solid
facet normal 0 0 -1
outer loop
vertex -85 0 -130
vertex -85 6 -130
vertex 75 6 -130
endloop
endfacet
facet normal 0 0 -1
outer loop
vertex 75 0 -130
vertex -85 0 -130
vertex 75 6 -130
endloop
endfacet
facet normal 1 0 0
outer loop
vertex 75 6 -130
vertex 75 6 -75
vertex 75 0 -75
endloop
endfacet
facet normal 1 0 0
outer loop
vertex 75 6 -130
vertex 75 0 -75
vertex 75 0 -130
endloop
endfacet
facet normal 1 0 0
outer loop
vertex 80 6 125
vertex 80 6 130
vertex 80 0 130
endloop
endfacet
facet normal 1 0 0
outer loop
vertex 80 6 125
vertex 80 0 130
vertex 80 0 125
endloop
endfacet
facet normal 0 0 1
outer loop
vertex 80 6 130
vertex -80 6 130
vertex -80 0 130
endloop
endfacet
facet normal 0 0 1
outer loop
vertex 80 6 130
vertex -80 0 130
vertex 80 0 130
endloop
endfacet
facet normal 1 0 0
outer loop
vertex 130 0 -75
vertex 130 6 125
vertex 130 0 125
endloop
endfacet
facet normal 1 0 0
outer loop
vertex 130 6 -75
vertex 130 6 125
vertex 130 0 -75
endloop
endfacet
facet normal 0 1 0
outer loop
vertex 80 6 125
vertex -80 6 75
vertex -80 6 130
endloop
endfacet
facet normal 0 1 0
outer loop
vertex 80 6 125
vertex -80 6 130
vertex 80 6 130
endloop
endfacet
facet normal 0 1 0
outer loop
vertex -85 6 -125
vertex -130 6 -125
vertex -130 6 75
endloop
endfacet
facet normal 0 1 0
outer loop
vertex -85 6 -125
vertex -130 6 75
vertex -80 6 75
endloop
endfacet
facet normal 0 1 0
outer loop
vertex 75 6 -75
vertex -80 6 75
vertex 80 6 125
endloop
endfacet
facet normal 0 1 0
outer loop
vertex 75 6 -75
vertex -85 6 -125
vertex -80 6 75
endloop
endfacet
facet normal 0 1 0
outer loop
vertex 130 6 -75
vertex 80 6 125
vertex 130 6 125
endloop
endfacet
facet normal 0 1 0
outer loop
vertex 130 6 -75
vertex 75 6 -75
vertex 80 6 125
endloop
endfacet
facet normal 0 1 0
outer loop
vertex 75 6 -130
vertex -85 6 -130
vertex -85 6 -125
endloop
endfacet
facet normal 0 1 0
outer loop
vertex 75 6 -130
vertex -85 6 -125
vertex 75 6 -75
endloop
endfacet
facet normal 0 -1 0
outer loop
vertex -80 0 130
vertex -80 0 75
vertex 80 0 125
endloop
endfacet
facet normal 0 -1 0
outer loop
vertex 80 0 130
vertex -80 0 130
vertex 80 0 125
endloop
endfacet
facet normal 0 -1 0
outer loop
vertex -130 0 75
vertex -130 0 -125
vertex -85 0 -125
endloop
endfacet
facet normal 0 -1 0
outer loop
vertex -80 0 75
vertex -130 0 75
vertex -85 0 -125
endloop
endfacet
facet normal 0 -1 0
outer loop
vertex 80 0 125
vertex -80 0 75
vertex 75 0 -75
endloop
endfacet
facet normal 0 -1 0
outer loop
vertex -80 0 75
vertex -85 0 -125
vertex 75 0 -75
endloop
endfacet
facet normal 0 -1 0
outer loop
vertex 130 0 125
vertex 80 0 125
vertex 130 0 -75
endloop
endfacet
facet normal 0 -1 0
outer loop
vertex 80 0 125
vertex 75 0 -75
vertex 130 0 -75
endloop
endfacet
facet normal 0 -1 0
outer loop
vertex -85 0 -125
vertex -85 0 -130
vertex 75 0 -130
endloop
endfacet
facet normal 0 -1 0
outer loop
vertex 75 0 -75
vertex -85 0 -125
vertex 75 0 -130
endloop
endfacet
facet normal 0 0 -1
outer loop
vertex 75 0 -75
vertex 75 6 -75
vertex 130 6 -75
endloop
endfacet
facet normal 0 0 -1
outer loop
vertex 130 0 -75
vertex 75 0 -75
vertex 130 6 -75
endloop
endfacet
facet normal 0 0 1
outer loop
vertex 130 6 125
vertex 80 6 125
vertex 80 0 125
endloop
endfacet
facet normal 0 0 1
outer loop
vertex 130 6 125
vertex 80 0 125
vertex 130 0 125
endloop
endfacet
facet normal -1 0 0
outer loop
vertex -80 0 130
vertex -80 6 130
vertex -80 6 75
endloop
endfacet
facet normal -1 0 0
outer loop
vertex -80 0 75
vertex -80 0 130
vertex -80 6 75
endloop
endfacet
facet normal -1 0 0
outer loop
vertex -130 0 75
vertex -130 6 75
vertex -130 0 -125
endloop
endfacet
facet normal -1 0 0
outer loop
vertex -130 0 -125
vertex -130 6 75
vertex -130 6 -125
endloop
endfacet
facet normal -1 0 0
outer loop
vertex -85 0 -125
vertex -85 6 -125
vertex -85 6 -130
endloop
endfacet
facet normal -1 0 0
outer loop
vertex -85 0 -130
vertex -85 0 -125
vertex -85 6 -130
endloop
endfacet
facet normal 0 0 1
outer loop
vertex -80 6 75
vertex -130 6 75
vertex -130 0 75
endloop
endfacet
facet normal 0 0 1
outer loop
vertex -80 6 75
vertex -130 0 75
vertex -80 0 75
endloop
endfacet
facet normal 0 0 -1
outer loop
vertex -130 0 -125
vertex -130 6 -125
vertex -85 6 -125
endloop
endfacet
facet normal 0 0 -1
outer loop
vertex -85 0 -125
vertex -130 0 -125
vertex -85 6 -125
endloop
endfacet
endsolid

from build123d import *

# Parameters (mm, degrees)
SKETCH1_W           = 150
SKETCH1_H           = 150
BOSS_EXTRUDE1_DEPTH = 6
CUT_EXTRUDE2_DEPTH  = 6
SKETCH3_W           = 55
SKETCH3_H           = 200
BOSS_EXTRUDE3_DEPTH = 6
SKETCH4_W           = 160
SKETCH4_H           = 55
BOSS_EXTRUDE4_DEPTH = 6
SKETCH5_W           = 55
SKETCH5_H           = 200
BOSS_EXTRUDE5_DEPTH = 6
SKETCH6_W           = 160
SKETCH6_H           = 55
BOSS_EXTRUDE6_DEPTH = 6


with BuildPart() as part:
    # Sketch1 → Boss-Extrude1 (new body)
    with BuildSketch(Plane(origin=(0, 0, 0), x_dir=(1, 0, 0), z_dir=(0, 1, 0))):
        Rectangle(SKETCH1_W, SKETCH1_H)
    extrude(amount=BOSS_EXTRUDE1_DEPTH)

    # Sketch2 → Cut-Extrude2 (cut)
    with BuildSketch(Plane(origin=(0, 6, 0), x_dir=(1, 0, 0), z_dir=(0, 1, 0))):
        Polygon((-5, -65), (-5, -5), (-65, -65), align=None)
        Polygon((-10, 0), (-5, 5), (-15, 5), align=None)
        Polygon((-5, 65), (-65, 65), (-5, 5), align=None)
        Polygon((-65, 5), (-15, 5), (-65, 55), align=None)
        Polygon((-10, 0), (-15, 5), (-65, 5), (-65, -5), (-15, -5), align=None)
        Polygon((-5, -5), (-10, 0), (-15, -5), align=None)
        Polygon((-65, -55), (-15, -5), (-65, -5), align=None)
        Polygon((5, 5), (65, 65), (5, 65), align=None)
        Polygon((65, -65), (5, -5), (5, -65), align=None)
        Polygon((15, 5), (5, 5), (10, 0), align=None)
        Polygon((65, 5), (15, 5), (10, 0), (15, -5), (65, -5), align=None)
        Polygon((65, 55), (15, 5), (65, 5), align=None)
        Polygon((15, -5), (10, 0), (5, -5), align=None)
        Polygon((65, -5), (15, -5), (65, -55), align=None)
    extrude(amount=-CUT_EXTRUDE2_DEPTH, mode=Mode.SUBTRACT)

    # Sketch3 → Boss-Extrude3 (add)
    with BuildSketch(Plane(origin=(0, 6, 0), x_dir=(1, 0, 0), z_dir=(0, 1, 0))):
        with Locations((102.5, -25)):
            Rectangle(SKETCH3_W, SKETCH3_H)
        Polygon((65, -65), (5, -5), (5, -65), align=None)
        Polygon((10, 0), (5, -5), (15, -5), (65, -55), (65, 55), (15, 5), (5, 5), align=None)
        Polygon((5, 65), (5, 5), (65, 65), align=None)
        Polygon((-5, -65), (-5, -5), (-65, -65), align=None)
        Polygon((-15, -5), (-5, -5), (-10, 0), (-5, 5), (-15, 5), (-65, 55), (-65, -55), align=None)
        Polygon((-65, 65), (-5, 5), (-5, 65), align=None)
    extrude(amount=-BOSS_EXTRUDE3_DEPTH)

    # Sketch4 → Boss-Extrude4 (add)
    with BuildSketch(Plane(origin=(0, 6, 0), x_dir=(1, 0, 0), z_dir=(0, 1, 0))):
        with Locations((0, -102.5)):
            Rectangle(SKETCH4_W, SKETCH4_H)
    extrude(amount=-BOSS_EXTRUDE4_DEPTH)

    # Sketch5 → Boss-Extrude5 (add)
    with BuildSketch(Plane(origin=(0, 6, 0), x_dir=(1, 0, 0), z_dir=(0, 1, 0))):
        with Locations((-102.5, 25)):
            Rectangle(SKETCH5_W, SKETCH5_H)
    extrude(amount=-BOSS_EXTRUDE5_DEPTH)

    # Sketch6 → Boss-Extrude6 (add)
    with BuildSketch(Plane(origin=(0, 6, 0), x_dir=(1, 0, 0), z_dir=(0, 1, 0))):
        with Locations((-5, 102.5)):
            Rectangle(SKETCH6_W, SKETCH6_H)
    extrude(amount=-BOSS_EXTRUDE6_DEPTH)


solid = part.part
